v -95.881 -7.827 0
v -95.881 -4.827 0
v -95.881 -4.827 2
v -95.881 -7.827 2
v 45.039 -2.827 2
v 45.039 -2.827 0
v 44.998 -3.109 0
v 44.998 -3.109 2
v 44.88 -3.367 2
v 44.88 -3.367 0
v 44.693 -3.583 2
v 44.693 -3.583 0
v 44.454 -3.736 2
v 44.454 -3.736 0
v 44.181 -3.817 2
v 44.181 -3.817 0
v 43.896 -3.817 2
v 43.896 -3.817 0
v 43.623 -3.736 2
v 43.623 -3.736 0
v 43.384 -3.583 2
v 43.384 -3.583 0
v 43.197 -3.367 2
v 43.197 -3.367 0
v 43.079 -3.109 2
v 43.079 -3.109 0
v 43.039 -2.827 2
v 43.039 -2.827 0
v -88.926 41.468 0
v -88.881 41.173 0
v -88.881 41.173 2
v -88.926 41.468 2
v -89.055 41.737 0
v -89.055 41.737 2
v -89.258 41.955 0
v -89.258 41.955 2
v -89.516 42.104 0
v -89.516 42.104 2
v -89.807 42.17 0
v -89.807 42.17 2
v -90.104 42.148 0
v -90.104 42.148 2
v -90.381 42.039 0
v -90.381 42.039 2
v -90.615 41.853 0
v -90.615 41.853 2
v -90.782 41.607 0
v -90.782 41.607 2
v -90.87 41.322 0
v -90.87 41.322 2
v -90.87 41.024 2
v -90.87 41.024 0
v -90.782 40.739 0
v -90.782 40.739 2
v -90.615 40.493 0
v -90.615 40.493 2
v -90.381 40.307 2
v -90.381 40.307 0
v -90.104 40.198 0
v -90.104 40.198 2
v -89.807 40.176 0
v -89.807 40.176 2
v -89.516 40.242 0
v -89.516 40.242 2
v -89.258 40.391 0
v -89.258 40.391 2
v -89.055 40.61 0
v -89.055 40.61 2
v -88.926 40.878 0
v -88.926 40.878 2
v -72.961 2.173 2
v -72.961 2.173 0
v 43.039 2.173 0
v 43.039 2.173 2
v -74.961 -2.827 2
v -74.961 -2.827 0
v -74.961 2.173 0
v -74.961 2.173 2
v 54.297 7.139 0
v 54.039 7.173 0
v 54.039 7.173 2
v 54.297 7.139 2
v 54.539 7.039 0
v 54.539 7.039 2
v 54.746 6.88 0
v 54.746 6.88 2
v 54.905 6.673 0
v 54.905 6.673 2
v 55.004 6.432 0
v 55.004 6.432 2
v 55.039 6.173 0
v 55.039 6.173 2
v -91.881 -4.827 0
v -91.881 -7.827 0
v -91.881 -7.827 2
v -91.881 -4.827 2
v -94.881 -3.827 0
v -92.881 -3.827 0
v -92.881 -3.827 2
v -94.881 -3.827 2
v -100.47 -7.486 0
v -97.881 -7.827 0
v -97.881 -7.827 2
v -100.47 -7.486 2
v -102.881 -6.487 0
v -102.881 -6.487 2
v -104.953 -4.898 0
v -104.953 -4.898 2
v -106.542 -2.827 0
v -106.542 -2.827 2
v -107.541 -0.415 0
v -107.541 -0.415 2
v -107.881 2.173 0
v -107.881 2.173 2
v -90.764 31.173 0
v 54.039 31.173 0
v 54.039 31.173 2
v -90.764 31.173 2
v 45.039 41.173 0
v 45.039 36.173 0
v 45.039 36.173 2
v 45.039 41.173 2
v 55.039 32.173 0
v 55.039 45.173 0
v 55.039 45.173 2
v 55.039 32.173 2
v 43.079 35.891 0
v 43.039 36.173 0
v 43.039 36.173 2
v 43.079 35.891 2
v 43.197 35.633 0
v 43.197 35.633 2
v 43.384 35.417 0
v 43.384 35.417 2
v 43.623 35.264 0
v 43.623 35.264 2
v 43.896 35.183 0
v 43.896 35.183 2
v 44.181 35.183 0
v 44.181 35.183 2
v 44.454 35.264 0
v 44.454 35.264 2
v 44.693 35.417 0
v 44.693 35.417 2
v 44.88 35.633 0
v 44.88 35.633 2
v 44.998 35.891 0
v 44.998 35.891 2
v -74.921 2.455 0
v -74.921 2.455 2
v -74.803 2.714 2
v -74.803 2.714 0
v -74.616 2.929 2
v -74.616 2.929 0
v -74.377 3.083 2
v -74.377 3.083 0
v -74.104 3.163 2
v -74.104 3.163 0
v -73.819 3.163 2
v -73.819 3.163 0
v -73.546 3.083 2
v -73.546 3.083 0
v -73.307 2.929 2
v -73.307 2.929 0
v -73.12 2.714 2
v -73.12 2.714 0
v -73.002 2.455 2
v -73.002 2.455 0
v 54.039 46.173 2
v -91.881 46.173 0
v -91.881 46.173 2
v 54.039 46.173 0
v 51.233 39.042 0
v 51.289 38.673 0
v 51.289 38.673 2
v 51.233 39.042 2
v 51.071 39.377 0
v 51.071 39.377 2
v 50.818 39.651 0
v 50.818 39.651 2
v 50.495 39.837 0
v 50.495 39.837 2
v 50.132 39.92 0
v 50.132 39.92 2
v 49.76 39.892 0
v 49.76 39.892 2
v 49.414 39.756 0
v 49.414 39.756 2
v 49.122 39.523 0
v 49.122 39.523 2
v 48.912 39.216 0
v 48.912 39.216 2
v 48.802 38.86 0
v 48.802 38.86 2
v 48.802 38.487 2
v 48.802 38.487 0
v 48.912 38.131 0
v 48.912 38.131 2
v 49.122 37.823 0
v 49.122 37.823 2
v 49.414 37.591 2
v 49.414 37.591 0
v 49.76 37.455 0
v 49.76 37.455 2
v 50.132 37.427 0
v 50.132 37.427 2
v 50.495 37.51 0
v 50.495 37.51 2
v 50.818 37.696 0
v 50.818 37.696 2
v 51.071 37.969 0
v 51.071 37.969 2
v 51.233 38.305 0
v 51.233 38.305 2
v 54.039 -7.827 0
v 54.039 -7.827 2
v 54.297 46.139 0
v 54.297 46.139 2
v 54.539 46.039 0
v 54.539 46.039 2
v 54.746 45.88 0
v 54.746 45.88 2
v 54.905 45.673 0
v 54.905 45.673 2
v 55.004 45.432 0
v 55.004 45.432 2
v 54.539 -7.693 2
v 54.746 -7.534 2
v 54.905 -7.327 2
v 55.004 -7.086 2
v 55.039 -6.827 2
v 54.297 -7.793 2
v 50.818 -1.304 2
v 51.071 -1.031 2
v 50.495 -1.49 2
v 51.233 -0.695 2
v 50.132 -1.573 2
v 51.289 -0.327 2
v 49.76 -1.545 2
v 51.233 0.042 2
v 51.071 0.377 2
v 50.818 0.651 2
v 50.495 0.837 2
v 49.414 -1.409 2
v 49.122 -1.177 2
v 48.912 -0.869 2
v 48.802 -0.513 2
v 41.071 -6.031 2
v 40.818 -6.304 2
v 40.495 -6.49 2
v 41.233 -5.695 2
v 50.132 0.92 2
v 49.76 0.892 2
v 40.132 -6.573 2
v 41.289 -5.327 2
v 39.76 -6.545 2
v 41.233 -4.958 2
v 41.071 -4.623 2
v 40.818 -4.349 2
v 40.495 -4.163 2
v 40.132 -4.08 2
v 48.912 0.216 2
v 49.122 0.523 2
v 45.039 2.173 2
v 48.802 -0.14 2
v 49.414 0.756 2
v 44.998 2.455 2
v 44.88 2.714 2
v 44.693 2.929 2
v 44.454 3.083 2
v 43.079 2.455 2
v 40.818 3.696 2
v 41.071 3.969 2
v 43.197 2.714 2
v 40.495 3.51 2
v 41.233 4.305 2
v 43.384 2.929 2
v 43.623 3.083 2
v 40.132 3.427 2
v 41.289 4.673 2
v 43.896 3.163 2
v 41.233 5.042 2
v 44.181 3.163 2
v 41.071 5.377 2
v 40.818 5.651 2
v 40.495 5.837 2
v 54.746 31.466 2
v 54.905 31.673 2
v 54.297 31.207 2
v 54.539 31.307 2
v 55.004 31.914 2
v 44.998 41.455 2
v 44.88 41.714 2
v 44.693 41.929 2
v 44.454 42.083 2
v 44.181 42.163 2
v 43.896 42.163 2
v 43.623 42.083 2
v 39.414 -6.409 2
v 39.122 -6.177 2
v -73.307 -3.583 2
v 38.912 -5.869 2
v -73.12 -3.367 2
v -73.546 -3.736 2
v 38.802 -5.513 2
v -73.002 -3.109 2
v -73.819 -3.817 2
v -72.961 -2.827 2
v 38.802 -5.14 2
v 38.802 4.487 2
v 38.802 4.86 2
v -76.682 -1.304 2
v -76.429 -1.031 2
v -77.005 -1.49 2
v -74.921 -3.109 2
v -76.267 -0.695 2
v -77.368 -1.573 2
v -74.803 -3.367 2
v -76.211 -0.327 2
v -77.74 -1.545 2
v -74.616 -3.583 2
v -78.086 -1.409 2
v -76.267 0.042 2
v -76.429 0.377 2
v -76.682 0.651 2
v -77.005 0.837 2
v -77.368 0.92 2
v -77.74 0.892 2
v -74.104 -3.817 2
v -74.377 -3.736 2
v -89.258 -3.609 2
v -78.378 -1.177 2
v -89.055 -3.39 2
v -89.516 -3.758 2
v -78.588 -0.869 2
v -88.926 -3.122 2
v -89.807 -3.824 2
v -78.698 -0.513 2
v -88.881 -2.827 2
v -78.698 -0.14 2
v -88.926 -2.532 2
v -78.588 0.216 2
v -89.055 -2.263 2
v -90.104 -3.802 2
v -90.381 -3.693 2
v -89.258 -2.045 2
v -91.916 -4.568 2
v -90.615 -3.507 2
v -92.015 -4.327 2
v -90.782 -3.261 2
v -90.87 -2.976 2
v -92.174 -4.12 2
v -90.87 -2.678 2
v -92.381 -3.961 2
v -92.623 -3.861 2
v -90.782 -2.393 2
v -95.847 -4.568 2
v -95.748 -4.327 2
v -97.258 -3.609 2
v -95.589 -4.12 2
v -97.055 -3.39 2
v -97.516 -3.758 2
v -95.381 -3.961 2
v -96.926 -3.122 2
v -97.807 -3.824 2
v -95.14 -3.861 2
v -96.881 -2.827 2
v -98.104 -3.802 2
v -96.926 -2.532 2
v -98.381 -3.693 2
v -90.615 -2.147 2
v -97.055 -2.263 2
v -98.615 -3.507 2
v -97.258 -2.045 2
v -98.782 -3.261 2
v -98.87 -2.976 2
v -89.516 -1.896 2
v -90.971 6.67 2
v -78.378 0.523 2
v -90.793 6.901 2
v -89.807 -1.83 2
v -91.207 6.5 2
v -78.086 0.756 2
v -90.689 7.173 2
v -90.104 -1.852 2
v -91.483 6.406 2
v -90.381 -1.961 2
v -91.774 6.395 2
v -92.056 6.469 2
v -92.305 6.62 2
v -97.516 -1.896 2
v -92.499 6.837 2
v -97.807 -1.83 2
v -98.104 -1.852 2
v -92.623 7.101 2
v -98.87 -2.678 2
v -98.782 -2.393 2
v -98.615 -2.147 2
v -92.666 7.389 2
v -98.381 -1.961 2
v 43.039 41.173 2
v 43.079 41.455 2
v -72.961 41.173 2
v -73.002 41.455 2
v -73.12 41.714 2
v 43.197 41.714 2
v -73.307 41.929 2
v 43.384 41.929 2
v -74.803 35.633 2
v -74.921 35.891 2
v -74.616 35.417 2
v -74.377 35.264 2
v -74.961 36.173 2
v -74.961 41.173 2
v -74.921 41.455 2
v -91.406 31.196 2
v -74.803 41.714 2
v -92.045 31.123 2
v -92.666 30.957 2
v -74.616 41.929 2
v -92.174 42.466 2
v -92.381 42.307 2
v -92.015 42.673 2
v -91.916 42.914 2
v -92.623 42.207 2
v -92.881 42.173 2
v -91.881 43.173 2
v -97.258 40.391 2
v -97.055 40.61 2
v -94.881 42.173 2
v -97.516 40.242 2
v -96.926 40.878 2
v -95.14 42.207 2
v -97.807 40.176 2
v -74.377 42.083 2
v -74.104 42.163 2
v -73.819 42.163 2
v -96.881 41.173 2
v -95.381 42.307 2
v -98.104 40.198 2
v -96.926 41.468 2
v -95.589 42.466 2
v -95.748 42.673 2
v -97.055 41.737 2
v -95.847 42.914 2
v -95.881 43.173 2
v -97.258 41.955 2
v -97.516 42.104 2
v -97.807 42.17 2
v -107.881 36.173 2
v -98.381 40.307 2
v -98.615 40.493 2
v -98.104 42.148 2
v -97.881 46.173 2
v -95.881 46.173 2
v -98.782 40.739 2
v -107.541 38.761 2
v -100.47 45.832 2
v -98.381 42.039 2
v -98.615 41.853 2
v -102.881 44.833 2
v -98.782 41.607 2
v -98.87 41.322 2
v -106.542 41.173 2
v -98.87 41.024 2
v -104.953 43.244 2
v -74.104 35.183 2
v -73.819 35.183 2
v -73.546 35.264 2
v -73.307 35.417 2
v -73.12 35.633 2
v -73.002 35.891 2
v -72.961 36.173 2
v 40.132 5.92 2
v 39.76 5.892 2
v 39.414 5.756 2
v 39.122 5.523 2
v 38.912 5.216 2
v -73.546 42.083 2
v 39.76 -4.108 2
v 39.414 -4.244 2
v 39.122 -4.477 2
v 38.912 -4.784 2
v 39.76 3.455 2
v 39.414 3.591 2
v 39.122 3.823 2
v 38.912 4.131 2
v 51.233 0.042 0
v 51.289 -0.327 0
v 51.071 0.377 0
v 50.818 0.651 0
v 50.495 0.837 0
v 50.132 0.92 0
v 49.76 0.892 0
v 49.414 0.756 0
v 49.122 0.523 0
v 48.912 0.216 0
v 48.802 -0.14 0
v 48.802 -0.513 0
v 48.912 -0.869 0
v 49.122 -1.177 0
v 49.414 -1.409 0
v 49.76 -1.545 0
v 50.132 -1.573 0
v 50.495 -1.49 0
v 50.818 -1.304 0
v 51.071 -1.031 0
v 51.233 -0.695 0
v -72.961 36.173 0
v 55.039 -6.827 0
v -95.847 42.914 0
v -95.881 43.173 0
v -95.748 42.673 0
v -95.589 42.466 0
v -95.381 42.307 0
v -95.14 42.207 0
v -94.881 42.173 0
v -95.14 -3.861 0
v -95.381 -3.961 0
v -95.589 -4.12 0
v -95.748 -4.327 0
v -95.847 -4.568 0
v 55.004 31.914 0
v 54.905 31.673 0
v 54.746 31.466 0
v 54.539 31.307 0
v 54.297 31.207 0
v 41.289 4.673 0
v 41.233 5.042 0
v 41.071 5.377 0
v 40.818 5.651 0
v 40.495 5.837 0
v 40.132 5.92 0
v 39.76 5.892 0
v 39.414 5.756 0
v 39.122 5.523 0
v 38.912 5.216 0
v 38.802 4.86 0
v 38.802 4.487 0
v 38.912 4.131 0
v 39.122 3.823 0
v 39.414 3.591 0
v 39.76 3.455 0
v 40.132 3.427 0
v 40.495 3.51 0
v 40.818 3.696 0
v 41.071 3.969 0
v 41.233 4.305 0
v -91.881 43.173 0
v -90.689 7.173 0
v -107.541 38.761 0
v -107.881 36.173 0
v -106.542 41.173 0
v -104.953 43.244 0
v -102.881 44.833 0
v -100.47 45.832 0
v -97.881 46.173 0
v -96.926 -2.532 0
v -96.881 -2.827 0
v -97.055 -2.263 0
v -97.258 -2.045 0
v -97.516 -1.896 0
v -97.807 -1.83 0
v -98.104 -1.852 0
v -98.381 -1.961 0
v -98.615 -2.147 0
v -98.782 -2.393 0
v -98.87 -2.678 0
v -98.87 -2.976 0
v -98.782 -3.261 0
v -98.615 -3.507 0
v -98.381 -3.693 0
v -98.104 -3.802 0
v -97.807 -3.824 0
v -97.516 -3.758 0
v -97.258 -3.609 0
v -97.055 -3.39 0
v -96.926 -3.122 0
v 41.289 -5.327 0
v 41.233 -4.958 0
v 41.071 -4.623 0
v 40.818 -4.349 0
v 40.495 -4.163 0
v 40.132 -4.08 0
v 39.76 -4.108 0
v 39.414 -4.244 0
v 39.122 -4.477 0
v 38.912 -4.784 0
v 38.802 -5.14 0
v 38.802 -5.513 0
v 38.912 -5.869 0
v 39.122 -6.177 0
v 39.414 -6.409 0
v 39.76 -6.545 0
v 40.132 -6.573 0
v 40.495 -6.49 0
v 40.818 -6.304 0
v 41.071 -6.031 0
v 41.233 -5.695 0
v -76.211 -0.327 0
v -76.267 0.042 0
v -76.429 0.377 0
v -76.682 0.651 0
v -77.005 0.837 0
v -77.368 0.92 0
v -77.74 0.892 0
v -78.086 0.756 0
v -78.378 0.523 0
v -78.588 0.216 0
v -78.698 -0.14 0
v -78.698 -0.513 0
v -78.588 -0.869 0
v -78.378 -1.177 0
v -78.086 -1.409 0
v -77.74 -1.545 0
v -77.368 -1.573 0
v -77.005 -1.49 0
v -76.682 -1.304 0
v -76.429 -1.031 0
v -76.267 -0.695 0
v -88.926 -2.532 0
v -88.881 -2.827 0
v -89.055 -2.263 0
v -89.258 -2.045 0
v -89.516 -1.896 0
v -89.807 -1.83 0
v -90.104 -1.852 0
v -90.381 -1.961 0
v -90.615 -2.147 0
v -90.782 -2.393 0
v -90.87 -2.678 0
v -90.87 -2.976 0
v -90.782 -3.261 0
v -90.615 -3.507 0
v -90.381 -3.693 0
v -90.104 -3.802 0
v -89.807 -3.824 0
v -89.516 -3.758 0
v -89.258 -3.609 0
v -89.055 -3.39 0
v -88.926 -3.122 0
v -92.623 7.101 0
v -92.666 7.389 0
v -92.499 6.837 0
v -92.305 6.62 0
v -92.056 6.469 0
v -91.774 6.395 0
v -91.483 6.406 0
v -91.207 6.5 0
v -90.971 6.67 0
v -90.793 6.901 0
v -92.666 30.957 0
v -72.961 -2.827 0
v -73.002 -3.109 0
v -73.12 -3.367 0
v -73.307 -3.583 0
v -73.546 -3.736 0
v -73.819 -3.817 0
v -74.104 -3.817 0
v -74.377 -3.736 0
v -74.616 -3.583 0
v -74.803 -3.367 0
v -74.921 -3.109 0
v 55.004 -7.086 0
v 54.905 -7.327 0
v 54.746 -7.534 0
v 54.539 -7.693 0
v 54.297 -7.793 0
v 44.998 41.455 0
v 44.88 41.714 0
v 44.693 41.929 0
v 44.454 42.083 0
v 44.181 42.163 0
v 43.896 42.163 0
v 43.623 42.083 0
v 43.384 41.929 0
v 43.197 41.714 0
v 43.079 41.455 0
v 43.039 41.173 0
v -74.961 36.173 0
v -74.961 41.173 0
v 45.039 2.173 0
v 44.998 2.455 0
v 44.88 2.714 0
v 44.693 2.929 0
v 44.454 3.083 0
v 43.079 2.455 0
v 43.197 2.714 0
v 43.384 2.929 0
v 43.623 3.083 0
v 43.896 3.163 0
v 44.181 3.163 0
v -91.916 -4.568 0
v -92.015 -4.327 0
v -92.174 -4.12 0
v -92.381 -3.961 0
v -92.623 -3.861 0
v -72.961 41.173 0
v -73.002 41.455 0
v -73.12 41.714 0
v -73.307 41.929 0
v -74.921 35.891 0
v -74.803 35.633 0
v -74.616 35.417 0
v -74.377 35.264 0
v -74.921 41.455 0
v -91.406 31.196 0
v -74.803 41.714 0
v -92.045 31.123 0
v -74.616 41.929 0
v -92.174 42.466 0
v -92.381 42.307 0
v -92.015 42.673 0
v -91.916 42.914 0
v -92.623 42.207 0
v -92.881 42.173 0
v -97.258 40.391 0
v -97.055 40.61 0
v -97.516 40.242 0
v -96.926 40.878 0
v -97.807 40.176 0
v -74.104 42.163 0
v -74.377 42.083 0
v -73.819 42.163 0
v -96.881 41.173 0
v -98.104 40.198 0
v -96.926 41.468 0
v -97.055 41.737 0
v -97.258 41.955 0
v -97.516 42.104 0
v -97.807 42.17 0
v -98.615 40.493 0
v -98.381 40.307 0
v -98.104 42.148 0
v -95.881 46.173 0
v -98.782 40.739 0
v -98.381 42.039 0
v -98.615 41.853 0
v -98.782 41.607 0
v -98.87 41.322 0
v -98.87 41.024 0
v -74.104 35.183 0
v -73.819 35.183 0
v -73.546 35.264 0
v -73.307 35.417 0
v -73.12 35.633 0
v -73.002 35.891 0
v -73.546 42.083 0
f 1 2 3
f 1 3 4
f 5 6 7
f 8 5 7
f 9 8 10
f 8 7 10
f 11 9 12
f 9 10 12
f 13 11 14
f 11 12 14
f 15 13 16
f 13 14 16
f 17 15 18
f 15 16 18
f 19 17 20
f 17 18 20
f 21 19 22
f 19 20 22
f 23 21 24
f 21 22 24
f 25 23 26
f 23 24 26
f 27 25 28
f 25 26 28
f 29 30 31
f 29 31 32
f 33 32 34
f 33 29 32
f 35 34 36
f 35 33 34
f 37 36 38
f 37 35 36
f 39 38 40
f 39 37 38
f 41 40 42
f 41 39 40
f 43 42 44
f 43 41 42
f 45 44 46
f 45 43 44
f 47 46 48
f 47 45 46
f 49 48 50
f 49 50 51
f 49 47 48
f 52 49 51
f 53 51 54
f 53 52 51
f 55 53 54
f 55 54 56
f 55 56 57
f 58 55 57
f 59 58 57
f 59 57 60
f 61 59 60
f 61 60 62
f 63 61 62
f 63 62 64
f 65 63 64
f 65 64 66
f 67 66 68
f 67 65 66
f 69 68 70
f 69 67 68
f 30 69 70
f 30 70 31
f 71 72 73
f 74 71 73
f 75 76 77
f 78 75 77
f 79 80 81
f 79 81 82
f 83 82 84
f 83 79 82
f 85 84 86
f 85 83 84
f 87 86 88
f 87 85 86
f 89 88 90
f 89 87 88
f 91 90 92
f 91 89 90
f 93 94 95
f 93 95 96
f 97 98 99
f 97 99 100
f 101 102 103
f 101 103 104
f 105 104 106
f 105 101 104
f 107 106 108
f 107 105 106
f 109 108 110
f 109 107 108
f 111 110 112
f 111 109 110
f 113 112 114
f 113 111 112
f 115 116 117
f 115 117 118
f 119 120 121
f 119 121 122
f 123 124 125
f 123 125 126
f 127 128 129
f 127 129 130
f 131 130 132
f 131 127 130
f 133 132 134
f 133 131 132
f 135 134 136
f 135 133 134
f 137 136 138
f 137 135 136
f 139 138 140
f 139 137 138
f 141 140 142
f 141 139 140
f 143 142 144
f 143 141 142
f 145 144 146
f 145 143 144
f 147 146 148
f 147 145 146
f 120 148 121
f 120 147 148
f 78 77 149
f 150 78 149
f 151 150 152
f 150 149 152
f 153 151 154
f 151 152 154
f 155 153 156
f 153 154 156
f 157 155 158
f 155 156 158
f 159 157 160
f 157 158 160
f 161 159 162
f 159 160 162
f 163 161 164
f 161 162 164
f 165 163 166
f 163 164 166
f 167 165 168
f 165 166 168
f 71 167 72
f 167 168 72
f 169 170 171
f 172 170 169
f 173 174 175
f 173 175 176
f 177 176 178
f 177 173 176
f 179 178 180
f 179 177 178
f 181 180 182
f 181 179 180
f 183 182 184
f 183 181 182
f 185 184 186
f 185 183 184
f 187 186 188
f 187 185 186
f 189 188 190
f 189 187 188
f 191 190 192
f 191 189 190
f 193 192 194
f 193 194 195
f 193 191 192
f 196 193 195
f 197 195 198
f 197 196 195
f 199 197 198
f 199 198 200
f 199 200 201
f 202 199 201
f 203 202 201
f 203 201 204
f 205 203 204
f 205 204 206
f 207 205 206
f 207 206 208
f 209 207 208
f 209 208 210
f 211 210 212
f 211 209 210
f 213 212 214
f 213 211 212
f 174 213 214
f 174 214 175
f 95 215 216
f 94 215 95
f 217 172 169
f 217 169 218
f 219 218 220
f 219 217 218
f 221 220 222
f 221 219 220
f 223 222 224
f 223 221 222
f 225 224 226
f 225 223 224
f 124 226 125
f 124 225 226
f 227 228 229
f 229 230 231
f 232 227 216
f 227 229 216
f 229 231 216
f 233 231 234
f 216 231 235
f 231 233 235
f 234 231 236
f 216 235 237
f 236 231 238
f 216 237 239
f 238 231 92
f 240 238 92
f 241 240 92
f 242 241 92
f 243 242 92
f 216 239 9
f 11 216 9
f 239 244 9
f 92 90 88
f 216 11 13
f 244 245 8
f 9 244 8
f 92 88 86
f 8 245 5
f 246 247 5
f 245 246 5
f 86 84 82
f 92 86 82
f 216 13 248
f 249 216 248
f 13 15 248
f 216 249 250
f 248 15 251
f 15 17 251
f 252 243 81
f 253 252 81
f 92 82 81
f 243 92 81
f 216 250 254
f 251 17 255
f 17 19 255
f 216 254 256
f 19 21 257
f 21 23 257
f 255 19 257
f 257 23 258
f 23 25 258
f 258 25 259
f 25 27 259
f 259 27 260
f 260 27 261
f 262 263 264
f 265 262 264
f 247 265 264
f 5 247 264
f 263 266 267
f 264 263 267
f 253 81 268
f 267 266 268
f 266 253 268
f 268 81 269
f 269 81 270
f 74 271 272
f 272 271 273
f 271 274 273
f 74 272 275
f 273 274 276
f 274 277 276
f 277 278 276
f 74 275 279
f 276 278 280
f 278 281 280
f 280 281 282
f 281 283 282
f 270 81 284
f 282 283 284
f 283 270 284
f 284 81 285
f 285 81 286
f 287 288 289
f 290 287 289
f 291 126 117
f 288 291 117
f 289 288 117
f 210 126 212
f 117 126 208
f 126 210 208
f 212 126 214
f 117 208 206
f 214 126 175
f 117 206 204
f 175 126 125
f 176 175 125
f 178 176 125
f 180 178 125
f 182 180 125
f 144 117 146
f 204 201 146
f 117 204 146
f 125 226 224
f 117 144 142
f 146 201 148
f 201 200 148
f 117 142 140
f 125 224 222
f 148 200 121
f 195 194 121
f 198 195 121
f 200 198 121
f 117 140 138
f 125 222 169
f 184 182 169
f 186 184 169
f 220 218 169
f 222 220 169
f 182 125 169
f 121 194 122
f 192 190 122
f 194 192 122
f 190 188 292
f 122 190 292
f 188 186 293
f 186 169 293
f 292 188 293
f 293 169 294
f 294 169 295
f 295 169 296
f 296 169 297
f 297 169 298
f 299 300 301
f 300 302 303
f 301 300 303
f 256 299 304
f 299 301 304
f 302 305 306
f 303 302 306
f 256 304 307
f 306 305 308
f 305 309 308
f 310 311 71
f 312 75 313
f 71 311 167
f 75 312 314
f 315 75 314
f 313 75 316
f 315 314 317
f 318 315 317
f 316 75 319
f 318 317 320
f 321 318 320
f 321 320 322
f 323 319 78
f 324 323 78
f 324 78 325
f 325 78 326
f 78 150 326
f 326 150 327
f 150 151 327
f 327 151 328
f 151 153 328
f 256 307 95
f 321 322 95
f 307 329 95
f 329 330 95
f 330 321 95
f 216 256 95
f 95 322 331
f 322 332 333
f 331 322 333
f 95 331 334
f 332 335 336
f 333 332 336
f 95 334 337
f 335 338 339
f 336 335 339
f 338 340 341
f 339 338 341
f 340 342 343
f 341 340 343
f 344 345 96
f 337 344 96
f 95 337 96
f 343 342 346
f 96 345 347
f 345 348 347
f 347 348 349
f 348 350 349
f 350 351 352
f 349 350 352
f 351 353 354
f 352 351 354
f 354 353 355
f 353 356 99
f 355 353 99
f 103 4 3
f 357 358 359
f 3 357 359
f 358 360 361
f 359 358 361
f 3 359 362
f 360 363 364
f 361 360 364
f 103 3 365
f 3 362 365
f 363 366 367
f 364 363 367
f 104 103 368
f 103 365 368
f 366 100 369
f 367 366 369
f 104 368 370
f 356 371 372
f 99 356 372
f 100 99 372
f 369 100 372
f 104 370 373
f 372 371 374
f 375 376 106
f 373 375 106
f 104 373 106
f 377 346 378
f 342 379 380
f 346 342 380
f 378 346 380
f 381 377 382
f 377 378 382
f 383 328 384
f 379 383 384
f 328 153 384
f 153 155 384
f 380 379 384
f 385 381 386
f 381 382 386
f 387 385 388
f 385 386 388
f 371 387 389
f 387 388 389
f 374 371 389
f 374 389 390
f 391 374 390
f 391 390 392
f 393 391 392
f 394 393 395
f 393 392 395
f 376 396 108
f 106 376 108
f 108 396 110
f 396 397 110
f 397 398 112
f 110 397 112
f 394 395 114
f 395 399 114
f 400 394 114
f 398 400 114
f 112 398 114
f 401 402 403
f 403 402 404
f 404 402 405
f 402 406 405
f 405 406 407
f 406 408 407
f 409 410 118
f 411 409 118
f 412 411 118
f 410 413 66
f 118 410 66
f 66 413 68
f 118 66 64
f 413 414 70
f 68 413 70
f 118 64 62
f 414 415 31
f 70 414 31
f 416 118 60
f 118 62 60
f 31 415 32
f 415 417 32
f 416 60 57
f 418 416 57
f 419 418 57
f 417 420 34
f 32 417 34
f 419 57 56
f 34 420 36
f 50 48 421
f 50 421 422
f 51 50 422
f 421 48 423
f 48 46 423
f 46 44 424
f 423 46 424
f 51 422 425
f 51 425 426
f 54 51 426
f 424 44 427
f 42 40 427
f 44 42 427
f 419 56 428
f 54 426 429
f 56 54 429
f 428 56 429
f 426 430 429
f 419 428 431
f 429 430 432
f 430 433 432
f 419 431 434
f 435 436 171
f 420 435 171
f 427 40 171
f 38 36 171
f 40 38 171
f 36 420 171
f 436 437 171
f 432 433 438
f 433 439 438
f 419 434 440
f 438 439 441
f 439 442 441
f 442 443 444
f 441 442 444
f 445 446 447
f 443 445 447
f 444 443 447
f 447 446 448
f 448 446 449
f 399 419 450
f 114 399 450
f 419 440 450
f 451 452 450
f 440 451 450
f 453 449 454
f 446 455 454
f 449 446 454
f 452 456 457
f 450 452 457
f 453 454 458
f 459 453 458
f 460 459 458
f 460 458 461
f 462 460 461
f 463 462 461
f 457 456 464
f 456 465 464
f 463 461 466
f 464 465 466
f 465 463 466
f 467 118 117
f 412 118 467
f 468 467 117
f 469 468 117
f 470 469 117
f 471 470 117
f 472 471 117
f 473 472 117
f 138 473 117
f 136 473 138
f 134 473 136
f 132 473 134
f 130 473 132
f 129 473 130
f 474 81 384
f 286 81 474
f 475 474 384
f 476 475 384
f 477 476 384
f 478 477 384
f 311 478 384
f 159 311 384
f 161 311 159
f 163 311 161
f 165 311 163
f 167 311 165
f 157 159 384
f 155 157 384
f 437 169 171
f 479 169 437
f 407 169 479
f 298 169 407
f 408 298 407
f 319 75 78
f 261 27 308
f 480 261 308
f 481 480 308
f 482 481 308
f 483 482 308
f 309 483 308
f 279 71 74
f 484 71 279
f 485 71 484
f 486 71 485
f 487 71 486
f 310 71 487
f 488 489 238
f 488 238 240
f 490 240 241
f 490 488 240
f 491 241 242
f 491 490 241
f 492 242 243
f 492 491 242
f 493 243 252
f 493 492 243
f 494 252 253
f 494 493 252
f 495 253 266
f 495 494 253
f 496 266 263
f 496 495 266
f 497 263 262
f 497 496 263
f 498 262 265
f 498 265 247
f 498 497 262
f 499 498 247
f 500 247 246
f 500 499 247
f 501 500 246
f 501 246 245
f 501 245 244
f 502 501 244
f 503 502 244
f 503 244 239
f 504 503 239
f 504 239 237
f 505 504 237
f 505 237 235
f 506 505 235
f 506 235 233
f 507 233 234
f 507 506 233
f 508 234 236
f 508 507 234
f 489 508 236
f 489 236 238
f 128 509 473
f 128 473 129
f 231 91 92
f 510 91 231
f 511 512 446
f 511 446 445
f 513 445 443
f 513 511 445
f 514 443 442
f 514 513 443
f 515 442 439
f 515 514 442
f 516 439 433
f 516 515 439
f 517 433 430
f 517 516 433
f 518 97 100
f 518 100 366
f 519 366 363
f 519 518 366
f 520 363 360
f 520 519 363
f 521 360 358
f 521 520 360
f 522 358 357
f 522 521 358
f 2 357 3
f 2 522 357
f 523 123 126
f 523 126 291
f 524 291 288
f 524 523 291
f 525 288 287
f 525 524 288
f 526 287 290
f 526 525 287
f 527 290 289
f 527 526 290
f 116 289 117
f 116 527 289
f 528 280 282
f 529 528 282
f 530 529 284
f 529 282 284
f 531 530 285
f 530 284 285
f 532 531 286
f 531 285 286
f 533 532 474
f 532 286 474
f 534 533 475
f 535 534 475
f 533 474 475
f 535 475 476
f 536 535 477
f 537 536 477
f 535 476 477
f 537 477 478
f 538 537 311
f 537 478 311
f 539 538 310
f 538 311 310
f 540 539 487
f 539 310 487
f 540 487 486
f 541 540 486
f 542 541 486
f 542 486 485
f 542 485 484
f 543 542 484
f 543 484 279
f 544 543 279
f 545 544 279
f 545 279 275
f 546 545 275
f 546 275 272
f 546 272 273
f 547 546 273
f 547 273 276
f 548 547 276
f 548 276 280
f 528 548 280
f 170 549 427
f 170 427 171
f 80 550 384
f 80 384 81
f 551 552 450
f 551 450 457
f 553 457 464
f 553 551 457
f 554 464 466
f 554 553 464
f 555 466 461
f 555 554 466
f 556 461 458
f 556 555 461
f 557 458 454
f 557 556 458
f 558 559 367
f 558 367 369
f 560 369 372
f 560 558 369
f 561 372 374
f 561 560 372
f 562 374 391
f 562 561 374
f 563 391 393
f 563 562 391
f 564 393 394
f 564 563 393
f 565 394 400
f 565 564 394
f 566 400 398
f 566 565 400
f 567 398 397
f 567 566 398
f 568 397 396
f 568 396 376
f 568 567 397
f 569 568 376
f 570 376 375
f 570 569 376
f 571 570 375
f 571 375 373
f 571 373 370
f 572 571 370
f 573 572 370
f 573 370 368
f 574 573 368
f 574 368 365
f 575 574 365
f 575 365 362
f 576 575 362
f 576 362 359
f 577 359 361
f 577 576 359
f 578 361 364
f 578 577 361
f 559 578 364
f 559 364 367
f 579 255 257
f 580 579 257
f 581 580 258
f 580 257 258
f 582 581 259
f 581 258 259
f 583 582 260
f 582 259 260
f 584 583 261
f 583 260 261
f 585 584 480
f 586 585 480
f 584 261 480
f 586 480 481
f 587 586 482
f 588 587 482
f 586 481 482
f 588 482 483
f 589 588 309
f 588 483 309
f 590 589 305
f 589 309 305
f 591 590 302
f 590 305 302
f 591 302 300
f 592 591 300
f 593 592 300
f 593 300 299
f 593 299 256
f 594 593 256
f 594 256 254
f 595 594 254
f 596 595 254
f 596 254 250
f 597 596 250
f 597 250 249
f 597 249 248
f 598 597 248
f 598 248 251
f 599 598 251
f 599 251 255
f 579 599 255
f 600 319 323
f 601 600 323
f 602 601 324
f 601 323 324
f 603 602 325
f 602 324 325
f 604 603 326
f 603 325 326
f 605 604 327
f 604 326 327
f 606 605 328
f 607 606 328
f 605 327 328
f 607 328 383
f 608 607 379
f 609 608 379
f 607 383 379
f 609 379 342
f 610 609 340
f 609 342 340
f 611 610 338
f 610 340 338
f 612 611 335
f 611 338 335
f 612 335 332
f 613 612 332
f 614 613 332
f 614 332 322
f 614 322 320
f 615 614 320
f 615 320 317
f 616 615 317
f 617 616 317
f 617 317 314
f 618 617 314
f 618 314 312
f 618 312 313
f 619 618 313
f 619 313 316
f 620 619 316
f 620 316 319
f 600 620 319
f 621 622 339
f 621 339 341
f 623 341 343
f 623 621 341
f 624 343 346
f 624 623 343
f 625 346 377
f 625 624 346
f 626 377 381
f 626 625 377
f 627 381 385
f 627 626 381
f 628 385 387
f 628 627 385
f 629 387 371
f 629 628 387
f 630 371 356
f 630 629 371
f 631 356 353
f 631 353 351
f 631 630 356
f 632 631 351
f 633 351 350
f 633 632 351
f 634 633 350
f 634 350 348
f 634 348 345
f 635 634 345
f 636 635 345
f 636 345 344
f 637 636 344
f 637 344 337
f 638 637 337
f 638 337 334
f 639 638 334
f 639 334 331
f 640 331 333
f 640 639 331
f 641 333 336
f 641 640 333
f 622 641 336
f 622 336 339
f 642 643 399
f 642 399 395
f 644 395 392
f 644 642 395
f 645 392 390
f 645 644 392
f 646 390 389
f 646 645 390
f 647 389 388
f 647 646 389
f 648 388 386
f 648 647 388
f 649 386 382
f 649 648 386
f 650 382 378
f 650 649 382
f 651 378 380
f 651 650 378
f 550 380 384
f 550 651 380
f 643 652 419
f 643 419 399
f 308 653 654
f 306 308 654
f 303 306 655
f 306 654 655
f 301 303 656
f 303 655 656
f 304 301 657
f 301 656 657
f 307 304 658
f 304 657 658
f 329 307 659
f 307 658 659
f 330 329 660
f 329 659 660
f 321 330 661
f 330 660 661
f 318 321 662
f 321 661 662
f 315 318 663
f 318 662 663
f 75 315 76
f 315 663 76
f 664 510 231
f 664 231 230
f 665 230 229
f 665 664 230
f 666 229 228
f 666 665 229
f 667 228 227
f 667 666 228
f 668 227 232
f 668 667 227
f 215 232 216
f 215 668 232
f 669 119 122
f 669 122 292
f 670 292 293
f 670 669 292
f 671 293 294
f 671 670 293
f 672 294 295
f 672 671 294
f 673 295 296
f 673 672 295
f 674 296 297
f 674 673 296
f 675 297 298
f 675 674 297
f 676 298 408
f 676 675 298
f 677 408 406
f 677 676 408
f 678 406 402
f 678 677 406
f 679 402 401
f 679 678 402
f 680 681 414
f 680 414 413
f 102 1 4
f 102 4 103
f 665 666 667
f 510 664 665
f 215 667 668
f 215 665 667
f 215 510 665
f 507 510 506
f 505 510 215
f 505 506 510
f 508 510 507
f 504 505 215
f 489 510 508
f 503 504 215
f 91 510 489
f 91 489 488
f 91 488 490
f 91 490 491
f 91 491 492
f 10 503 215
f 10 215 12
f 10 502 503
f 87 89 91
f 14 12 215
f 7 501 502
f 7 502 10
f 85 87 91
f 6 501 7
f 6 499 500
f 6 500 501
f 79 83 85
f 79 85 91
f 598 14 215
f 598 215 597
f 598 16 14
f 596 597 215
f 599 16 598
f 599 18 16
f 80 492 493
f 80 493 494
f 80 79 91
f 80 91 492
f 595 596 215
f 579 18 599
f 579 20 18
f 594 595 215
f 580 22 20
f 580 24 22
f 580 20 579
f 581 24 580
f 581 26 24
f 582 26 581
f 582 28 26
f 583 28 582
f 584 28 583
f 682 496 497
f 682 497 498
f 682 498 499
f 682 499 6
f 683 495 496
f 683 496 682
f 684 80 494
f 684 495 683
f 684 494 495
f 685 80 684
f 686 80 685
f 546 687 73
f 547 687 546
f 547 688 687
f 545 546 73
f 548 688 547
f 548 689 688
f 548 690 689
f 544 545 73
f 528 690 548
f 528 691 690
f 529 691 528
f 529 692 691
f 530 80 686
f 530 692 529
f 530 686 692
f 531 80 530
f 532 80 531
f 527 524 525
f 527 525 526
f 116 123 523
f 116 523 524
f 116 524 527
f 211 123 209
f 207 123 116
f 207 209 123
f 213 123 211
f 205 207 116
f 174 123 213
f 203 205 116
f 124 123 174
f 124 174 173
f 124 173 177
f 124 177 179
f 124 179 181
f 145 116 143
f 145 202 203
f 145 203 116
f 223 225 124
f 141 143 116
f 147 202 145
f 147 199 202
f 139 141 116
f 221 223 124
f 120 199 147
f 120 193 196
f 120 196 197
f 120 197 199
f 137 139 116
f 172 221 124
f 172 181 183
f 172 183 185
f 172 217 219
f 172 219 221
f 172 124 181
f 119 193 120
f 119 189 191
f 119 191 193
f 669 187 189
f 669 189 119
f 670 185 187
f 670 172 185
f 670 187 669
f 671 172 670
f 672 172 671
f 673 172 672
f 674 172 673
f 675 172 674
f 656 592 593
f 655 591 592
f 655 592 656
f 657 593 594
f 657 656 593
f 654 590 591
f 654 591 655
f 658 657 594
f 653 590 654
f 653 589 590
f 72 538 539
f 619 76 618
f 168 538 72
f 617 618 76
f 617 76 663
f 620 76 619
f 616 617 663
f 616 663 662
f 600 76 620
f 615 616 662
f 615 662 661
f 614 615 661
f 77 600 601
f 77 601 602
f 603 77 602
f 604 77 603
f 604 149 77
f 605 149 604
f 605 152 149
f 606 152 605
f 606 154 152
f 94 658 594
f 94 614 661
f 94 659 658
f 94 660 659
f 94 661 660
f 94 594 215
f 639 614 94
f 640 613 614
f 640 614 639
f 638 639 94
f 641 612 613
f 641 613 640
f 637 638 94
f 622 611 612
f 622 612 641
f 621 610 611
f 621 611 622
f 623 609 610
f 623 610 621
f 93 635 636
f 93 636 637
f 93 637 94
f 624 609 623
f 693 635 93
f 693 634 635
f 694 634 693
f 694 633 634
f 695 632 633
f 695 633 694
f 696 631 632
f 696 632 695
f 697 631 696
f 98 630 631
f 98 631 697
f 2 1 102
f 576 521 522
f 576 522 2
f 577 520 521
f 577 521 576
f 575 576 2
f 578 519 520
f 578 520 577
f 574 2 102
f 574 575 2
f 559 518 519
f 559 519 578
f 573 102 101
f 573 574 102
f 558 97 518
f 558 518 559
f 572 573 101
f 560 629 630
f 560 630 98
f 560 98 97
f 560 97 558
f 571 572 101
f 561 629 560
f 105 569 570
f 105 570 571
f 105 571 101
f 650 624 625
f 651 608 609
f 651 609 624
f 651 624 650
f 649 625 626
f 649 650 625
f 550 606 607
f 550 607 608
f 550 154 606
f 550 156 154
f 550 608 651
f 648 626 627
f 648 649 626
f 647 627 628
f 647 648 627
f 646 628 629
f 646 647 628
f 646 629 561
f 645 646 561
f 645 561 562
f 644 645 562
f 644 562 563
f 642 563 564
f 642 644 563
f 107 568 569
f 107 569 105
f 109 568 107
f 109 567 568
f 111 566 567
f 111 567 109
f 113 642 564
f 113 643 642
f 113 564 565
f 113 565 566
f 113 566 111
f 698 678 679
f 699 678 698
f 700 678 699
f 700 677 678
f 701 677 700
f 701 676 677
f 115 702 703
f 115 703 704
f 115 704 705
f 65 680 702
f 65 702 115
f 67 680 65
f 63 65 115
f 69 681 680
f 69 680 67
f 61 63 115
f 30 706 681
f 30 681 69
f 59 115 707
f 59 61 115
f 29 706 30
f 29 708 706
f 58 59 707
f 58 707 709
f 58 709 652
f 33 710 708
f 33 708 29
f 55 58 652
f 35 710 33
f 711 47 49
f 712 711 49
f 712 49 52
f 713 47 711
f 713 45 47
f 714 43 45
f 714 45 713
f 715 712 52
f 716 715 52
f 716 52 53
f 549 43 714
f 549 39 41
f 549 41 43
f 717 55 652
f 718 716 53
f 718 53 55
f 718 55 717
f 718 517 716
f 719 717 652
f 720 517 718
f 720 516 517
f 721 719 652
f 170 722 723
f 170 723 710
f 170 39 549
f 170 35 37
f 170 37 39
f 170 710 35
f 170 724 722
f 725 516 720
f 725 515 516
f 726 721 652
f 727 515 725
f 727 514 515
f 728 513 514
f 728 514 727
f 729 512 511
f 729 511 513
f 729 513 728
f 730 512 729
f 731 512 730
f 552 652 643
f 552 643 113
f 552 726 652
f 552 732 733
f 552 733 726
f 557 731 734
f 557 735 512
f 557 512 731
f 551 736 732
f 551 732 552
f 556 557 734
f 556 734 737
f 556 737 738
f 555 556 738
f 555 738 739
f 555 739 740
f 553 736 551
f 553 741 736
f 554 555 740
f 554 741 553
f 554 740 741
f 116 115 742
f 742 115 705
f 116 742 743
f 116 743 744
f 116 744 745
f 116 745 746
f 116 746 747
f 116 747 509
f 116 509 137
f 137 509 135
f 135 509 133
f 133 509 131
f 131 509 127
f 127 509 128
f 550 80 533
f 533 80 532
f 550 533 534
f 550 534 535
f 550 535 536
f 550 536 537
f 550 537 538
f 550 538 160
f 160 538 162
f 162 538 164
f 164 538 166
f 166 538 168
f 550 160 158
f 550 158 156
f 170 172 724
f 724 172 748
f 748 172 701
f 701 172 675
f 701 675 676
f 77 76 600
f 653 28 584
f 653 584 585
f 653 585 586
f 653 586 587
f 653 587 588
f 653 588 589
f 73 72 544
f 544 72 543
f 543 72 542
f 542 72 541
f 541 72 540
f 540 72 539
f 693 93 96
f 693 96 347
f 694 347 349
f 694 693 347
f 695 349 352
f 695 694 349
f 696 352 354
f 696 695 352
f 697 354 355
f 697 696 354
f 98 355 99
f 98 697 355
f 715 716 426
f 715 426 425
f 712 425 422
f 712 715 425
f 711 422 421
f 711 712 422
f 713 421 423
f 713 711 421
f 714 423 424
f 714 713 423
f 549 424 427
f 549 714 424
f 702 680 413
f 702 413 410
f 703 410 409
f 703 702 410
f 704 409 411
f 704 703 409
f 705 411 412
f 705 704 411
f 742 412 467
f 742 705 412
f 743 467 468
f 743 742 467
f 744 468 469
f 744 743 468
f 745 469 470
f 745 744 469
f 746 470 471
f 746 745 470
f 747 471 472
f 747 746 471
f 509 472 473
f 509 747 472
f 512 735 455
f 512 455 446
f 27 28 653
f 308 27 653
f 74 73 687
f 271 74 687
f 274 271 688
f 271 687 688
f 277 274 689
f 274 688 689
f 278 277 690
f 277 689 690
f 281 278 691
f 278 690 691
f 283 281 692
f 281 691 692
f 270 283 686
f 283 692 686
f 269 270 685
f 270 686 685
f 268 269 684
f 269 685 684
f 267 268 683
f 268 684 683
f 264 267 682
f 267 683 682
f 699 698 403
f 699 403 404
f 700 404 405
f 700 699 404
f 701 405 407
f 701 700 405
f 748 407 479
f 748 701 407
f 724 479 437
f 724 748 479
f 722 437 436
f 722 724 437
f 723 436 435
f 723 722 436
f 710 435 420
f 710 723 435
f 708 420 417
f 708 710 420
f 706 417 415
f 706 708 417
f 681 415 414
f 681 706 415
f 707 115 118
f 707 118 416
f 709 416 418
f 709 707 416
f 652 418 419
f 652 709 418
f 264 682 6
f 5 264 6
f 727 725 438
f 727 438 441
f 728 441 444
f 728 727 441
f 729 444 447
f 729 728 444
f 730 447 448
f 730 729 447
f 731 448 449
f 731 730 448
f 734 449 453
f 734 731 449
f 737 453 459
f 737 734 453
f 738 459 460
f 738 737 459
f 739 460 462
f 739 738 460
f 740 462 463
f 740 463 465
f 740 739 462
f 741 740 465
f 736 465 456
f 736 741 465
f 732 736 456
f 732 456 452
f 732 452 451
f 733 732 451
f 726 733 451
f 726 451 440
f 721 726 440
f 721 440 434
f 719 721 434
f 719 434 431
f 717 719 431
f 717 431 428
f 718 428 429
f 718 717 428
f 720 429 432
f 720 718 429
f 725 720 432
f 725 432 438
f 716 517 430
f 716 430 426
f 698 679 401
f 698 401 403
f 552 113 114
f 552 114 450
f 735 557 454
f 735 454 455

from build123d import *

# Parameters (mm, degrees)
SKETCH_1_R          = 1
SKETCH_1_R_2        = 1.25
EXTRUDE_2_DEPTH     = 2
SKETCH_2_R          = 1.25
CUT_EXTRUDE_1_DEPTH = 10


with BuildPart() as part:
    # 草圖1 → 填料-伸長2 (new body)
    with BuildSketch(Plane.XY):
        with BuildLine():
            Line((55.038502783, 45.173220339), (55.038502783, 32.173220339))
            ThreePointArc((55.038502783, 32.173220339), (54.745609564, 31.466113558), (54.038502783, 31.173220339))
            Line((54.038502783, 31.173220339), (-90.763626261, 31.173220339))
            ThreePointArc((-90.763626261, 31.173220339), (-91.726620083, 31.171182694), (-92.665560041, 30.957283163))
            Line((-92.665560041, 30.957283163), (-92.665560041, 7.389157515))
            ThreePointArc((-92.665560041, 7.389157515), (-91.774171138, 6.395073197), (-90.689152782, 7.173220339))
            Line((-90.689152782, 7.173220339), (54.038502783, 7.173220339))
            ThreePointArc((54.038502783, 7.173220339), (54.745609564, 6.88032712), (55.038502783, 6.173220339))
            Line((55.038502783, 6.173220339), (55.038502783, -6.826779661))
            ThreePointArc((55.038502783, -6.826779661), (54.745609564, -7.533886442), (54.038502783, -7.826779661))
            Line((54.038502783, -7.826779661), (-91.881497217, -7.826779661))
            Line((-91.881497217, -7.826779661), (-91.881497217, -4.826779661))
            ThreePointArc((-91.881497217, -4.826779661), (-92.174390436, -4.11967288), (-92.881497217, -3.826779661))
            Line((-92.881497217, -3.826779661), (-94.881497217, -3.826779661))
            ThreePointArc((-94.881497217, -3.826779661), (-95.588603998, -4.11967288), (-95.881497217, -4.826779661))
            Line((-95.881497217, -4.826779661), (-95.881497217, -7.826779661))
            Line((-95.881497217, -7.826779661), (-97.881497217, -7.826779661))
            ThreePointArc((-97.881497217, -7.826779661), (-104.952565029, -4.897847473), (-107.881497217, 2.173220339))
            Line((-107.881497217, 2.173220339), (-107.881497217, 36.173220339))
            ThreePointArc((-107.881497217, 36.173220339), (-104.952565029, 43.244288151), (-97.881497217, 46.173220339))
            Line((-97.881497217, 46.173220339), (-95.881497217, 46.173220339))
            Line((-95.881497217, 46.173220339), (-95.881497217, 43.173220339))
            ThreePointArc((-95.881497217, 43.173220339), (-95.588603998, 42.466113558), (-94.881497217, 42.173220339))
            Line((-94.881497217, 42.173220339), (-92.881497217, 42.173220339))
            ThreePointArc((-92.881497217, 42.173220339), (-92.174390436, 42.466113558), (-91.881497217, 43.173220339))
            Line((-91.881497217, 43.173220339), (-91.881497217, 46.173220339))
            Line((-91.881497217, 46.173220339), (54.038502783, 46.173220339))
            ThreePointArc((54.038502783, 46.173220339), (54.745609564, 45.88032712), (55.038502783, 45.173220339))
        make_face()
        with Locations((-97.881497217, 41.173220339)):
            Circle(SKETCH_1_R, mode=Mode.SUBTRACT)
        with Locations((-89.881497217, 41.173220339)):
            Circle(SKETCH_1_R, mode=Mode.SUBTRACT)
        with Locations((-89.881497217, -2.826779661)):
            Circle(SKETCH_1_R, mode=Mode.SUBTRACT)
        with Locations((-97.881497217, -2.826779661)):
            Circle(SKETCH_1_R, mode=Mode.SUBTRACT)
        with Locations((50.038502783, 38.673220339)):
            Circle(SKETCH_1_R_2, mode=Mode.SUBTRACT)
        with Locations((50.038502783, -0.326779661)):
            Circle(SKETCH_1_R_2, mode=Mode.SUBTRACT)
        with BuildLine():
            Line((-74.961497217, -2.826779661), (-74.961497217, 2.173220339))
            ThreePointArc((-74.961497217, 2.173220339), (-73.961497217, 3.173220339), (-72.961497217, 2.173220339))
            Line((-72.961497217, 2.173220339), (43.038502783, 2.173220339))
            ThreePointArc((43.038502783, 2.173220339), (44.038502783, 3.173220339), (45.038502783, 2.173220339))
            Line((45.038502783, 2.173220339), (45.038502783, -2.826779661))
            ThreePointArc((45.038502783, -2.826779661), (44.038502783, -3.826779661), (43.038502783, -2.826779661))
            Line((43.038502783, -2.826779661), (-72.961497217, -2.826779661))
            ThreePointArc((-72.961497217, -2.826779661), (-73.961497217, -3.826779661), (-74.961497217, -2.826779661))
        make_face(mode=Mode.SUBTRACT)
        with BuildLine():
            Line((43.038502783, 41.173220339), (-72.961497217, 41.173220339))
            ThreePointArc((-72.961497217, 41.173220339), (-73.961497217, 42.173220339), (-74.961497217, 41.173220339))
            Line((-74.961497217, 41.173220339), (-74.961497217, 36.173220339))
            ThreePointArc((-74.961497217, 36.173220339), (-73.961497217, 35.173220339), (-72.961497217, 36.173220339))
            Line((-72.961497217, 36.173220339), (43.038502783, 36.173220339))
            ThreePointArc((43.038502783, 36.173220339), (44.038502783, 35.173220339), (45.038502783, 36.173220339))
            Line((45.038502783, 36.173220339), (45.038502783, 41.173220339))
            ThreePointArc((45.038502783, 41.173220339), (44.038502783, 42.173220339), (43.038502783, 41.173220339))
        make_face(mode=Mode.SUBTRACT)
    extrude(amount=EXTRUDE_2_DEPTH)

    # 草圖2 → 除料-伸長1 (cut)
    with BuildSketch(Plane.XY.offset(2)):
        with Locations((-77.461497217, -0.326779661)):
            Circle(SKETCH_2_R)
        with Locations((40.038502783, 4.673220339)):
            Circle(SKETCH_2_R)
        with Locations((40.038502783, -5.326779661)):
            Circle(SKETCH_2_R)
    extrude(amount=-CUT_EXTRUDE_1_DEPTH, mode=Mode.SUBTRACT)


solid = part.part
